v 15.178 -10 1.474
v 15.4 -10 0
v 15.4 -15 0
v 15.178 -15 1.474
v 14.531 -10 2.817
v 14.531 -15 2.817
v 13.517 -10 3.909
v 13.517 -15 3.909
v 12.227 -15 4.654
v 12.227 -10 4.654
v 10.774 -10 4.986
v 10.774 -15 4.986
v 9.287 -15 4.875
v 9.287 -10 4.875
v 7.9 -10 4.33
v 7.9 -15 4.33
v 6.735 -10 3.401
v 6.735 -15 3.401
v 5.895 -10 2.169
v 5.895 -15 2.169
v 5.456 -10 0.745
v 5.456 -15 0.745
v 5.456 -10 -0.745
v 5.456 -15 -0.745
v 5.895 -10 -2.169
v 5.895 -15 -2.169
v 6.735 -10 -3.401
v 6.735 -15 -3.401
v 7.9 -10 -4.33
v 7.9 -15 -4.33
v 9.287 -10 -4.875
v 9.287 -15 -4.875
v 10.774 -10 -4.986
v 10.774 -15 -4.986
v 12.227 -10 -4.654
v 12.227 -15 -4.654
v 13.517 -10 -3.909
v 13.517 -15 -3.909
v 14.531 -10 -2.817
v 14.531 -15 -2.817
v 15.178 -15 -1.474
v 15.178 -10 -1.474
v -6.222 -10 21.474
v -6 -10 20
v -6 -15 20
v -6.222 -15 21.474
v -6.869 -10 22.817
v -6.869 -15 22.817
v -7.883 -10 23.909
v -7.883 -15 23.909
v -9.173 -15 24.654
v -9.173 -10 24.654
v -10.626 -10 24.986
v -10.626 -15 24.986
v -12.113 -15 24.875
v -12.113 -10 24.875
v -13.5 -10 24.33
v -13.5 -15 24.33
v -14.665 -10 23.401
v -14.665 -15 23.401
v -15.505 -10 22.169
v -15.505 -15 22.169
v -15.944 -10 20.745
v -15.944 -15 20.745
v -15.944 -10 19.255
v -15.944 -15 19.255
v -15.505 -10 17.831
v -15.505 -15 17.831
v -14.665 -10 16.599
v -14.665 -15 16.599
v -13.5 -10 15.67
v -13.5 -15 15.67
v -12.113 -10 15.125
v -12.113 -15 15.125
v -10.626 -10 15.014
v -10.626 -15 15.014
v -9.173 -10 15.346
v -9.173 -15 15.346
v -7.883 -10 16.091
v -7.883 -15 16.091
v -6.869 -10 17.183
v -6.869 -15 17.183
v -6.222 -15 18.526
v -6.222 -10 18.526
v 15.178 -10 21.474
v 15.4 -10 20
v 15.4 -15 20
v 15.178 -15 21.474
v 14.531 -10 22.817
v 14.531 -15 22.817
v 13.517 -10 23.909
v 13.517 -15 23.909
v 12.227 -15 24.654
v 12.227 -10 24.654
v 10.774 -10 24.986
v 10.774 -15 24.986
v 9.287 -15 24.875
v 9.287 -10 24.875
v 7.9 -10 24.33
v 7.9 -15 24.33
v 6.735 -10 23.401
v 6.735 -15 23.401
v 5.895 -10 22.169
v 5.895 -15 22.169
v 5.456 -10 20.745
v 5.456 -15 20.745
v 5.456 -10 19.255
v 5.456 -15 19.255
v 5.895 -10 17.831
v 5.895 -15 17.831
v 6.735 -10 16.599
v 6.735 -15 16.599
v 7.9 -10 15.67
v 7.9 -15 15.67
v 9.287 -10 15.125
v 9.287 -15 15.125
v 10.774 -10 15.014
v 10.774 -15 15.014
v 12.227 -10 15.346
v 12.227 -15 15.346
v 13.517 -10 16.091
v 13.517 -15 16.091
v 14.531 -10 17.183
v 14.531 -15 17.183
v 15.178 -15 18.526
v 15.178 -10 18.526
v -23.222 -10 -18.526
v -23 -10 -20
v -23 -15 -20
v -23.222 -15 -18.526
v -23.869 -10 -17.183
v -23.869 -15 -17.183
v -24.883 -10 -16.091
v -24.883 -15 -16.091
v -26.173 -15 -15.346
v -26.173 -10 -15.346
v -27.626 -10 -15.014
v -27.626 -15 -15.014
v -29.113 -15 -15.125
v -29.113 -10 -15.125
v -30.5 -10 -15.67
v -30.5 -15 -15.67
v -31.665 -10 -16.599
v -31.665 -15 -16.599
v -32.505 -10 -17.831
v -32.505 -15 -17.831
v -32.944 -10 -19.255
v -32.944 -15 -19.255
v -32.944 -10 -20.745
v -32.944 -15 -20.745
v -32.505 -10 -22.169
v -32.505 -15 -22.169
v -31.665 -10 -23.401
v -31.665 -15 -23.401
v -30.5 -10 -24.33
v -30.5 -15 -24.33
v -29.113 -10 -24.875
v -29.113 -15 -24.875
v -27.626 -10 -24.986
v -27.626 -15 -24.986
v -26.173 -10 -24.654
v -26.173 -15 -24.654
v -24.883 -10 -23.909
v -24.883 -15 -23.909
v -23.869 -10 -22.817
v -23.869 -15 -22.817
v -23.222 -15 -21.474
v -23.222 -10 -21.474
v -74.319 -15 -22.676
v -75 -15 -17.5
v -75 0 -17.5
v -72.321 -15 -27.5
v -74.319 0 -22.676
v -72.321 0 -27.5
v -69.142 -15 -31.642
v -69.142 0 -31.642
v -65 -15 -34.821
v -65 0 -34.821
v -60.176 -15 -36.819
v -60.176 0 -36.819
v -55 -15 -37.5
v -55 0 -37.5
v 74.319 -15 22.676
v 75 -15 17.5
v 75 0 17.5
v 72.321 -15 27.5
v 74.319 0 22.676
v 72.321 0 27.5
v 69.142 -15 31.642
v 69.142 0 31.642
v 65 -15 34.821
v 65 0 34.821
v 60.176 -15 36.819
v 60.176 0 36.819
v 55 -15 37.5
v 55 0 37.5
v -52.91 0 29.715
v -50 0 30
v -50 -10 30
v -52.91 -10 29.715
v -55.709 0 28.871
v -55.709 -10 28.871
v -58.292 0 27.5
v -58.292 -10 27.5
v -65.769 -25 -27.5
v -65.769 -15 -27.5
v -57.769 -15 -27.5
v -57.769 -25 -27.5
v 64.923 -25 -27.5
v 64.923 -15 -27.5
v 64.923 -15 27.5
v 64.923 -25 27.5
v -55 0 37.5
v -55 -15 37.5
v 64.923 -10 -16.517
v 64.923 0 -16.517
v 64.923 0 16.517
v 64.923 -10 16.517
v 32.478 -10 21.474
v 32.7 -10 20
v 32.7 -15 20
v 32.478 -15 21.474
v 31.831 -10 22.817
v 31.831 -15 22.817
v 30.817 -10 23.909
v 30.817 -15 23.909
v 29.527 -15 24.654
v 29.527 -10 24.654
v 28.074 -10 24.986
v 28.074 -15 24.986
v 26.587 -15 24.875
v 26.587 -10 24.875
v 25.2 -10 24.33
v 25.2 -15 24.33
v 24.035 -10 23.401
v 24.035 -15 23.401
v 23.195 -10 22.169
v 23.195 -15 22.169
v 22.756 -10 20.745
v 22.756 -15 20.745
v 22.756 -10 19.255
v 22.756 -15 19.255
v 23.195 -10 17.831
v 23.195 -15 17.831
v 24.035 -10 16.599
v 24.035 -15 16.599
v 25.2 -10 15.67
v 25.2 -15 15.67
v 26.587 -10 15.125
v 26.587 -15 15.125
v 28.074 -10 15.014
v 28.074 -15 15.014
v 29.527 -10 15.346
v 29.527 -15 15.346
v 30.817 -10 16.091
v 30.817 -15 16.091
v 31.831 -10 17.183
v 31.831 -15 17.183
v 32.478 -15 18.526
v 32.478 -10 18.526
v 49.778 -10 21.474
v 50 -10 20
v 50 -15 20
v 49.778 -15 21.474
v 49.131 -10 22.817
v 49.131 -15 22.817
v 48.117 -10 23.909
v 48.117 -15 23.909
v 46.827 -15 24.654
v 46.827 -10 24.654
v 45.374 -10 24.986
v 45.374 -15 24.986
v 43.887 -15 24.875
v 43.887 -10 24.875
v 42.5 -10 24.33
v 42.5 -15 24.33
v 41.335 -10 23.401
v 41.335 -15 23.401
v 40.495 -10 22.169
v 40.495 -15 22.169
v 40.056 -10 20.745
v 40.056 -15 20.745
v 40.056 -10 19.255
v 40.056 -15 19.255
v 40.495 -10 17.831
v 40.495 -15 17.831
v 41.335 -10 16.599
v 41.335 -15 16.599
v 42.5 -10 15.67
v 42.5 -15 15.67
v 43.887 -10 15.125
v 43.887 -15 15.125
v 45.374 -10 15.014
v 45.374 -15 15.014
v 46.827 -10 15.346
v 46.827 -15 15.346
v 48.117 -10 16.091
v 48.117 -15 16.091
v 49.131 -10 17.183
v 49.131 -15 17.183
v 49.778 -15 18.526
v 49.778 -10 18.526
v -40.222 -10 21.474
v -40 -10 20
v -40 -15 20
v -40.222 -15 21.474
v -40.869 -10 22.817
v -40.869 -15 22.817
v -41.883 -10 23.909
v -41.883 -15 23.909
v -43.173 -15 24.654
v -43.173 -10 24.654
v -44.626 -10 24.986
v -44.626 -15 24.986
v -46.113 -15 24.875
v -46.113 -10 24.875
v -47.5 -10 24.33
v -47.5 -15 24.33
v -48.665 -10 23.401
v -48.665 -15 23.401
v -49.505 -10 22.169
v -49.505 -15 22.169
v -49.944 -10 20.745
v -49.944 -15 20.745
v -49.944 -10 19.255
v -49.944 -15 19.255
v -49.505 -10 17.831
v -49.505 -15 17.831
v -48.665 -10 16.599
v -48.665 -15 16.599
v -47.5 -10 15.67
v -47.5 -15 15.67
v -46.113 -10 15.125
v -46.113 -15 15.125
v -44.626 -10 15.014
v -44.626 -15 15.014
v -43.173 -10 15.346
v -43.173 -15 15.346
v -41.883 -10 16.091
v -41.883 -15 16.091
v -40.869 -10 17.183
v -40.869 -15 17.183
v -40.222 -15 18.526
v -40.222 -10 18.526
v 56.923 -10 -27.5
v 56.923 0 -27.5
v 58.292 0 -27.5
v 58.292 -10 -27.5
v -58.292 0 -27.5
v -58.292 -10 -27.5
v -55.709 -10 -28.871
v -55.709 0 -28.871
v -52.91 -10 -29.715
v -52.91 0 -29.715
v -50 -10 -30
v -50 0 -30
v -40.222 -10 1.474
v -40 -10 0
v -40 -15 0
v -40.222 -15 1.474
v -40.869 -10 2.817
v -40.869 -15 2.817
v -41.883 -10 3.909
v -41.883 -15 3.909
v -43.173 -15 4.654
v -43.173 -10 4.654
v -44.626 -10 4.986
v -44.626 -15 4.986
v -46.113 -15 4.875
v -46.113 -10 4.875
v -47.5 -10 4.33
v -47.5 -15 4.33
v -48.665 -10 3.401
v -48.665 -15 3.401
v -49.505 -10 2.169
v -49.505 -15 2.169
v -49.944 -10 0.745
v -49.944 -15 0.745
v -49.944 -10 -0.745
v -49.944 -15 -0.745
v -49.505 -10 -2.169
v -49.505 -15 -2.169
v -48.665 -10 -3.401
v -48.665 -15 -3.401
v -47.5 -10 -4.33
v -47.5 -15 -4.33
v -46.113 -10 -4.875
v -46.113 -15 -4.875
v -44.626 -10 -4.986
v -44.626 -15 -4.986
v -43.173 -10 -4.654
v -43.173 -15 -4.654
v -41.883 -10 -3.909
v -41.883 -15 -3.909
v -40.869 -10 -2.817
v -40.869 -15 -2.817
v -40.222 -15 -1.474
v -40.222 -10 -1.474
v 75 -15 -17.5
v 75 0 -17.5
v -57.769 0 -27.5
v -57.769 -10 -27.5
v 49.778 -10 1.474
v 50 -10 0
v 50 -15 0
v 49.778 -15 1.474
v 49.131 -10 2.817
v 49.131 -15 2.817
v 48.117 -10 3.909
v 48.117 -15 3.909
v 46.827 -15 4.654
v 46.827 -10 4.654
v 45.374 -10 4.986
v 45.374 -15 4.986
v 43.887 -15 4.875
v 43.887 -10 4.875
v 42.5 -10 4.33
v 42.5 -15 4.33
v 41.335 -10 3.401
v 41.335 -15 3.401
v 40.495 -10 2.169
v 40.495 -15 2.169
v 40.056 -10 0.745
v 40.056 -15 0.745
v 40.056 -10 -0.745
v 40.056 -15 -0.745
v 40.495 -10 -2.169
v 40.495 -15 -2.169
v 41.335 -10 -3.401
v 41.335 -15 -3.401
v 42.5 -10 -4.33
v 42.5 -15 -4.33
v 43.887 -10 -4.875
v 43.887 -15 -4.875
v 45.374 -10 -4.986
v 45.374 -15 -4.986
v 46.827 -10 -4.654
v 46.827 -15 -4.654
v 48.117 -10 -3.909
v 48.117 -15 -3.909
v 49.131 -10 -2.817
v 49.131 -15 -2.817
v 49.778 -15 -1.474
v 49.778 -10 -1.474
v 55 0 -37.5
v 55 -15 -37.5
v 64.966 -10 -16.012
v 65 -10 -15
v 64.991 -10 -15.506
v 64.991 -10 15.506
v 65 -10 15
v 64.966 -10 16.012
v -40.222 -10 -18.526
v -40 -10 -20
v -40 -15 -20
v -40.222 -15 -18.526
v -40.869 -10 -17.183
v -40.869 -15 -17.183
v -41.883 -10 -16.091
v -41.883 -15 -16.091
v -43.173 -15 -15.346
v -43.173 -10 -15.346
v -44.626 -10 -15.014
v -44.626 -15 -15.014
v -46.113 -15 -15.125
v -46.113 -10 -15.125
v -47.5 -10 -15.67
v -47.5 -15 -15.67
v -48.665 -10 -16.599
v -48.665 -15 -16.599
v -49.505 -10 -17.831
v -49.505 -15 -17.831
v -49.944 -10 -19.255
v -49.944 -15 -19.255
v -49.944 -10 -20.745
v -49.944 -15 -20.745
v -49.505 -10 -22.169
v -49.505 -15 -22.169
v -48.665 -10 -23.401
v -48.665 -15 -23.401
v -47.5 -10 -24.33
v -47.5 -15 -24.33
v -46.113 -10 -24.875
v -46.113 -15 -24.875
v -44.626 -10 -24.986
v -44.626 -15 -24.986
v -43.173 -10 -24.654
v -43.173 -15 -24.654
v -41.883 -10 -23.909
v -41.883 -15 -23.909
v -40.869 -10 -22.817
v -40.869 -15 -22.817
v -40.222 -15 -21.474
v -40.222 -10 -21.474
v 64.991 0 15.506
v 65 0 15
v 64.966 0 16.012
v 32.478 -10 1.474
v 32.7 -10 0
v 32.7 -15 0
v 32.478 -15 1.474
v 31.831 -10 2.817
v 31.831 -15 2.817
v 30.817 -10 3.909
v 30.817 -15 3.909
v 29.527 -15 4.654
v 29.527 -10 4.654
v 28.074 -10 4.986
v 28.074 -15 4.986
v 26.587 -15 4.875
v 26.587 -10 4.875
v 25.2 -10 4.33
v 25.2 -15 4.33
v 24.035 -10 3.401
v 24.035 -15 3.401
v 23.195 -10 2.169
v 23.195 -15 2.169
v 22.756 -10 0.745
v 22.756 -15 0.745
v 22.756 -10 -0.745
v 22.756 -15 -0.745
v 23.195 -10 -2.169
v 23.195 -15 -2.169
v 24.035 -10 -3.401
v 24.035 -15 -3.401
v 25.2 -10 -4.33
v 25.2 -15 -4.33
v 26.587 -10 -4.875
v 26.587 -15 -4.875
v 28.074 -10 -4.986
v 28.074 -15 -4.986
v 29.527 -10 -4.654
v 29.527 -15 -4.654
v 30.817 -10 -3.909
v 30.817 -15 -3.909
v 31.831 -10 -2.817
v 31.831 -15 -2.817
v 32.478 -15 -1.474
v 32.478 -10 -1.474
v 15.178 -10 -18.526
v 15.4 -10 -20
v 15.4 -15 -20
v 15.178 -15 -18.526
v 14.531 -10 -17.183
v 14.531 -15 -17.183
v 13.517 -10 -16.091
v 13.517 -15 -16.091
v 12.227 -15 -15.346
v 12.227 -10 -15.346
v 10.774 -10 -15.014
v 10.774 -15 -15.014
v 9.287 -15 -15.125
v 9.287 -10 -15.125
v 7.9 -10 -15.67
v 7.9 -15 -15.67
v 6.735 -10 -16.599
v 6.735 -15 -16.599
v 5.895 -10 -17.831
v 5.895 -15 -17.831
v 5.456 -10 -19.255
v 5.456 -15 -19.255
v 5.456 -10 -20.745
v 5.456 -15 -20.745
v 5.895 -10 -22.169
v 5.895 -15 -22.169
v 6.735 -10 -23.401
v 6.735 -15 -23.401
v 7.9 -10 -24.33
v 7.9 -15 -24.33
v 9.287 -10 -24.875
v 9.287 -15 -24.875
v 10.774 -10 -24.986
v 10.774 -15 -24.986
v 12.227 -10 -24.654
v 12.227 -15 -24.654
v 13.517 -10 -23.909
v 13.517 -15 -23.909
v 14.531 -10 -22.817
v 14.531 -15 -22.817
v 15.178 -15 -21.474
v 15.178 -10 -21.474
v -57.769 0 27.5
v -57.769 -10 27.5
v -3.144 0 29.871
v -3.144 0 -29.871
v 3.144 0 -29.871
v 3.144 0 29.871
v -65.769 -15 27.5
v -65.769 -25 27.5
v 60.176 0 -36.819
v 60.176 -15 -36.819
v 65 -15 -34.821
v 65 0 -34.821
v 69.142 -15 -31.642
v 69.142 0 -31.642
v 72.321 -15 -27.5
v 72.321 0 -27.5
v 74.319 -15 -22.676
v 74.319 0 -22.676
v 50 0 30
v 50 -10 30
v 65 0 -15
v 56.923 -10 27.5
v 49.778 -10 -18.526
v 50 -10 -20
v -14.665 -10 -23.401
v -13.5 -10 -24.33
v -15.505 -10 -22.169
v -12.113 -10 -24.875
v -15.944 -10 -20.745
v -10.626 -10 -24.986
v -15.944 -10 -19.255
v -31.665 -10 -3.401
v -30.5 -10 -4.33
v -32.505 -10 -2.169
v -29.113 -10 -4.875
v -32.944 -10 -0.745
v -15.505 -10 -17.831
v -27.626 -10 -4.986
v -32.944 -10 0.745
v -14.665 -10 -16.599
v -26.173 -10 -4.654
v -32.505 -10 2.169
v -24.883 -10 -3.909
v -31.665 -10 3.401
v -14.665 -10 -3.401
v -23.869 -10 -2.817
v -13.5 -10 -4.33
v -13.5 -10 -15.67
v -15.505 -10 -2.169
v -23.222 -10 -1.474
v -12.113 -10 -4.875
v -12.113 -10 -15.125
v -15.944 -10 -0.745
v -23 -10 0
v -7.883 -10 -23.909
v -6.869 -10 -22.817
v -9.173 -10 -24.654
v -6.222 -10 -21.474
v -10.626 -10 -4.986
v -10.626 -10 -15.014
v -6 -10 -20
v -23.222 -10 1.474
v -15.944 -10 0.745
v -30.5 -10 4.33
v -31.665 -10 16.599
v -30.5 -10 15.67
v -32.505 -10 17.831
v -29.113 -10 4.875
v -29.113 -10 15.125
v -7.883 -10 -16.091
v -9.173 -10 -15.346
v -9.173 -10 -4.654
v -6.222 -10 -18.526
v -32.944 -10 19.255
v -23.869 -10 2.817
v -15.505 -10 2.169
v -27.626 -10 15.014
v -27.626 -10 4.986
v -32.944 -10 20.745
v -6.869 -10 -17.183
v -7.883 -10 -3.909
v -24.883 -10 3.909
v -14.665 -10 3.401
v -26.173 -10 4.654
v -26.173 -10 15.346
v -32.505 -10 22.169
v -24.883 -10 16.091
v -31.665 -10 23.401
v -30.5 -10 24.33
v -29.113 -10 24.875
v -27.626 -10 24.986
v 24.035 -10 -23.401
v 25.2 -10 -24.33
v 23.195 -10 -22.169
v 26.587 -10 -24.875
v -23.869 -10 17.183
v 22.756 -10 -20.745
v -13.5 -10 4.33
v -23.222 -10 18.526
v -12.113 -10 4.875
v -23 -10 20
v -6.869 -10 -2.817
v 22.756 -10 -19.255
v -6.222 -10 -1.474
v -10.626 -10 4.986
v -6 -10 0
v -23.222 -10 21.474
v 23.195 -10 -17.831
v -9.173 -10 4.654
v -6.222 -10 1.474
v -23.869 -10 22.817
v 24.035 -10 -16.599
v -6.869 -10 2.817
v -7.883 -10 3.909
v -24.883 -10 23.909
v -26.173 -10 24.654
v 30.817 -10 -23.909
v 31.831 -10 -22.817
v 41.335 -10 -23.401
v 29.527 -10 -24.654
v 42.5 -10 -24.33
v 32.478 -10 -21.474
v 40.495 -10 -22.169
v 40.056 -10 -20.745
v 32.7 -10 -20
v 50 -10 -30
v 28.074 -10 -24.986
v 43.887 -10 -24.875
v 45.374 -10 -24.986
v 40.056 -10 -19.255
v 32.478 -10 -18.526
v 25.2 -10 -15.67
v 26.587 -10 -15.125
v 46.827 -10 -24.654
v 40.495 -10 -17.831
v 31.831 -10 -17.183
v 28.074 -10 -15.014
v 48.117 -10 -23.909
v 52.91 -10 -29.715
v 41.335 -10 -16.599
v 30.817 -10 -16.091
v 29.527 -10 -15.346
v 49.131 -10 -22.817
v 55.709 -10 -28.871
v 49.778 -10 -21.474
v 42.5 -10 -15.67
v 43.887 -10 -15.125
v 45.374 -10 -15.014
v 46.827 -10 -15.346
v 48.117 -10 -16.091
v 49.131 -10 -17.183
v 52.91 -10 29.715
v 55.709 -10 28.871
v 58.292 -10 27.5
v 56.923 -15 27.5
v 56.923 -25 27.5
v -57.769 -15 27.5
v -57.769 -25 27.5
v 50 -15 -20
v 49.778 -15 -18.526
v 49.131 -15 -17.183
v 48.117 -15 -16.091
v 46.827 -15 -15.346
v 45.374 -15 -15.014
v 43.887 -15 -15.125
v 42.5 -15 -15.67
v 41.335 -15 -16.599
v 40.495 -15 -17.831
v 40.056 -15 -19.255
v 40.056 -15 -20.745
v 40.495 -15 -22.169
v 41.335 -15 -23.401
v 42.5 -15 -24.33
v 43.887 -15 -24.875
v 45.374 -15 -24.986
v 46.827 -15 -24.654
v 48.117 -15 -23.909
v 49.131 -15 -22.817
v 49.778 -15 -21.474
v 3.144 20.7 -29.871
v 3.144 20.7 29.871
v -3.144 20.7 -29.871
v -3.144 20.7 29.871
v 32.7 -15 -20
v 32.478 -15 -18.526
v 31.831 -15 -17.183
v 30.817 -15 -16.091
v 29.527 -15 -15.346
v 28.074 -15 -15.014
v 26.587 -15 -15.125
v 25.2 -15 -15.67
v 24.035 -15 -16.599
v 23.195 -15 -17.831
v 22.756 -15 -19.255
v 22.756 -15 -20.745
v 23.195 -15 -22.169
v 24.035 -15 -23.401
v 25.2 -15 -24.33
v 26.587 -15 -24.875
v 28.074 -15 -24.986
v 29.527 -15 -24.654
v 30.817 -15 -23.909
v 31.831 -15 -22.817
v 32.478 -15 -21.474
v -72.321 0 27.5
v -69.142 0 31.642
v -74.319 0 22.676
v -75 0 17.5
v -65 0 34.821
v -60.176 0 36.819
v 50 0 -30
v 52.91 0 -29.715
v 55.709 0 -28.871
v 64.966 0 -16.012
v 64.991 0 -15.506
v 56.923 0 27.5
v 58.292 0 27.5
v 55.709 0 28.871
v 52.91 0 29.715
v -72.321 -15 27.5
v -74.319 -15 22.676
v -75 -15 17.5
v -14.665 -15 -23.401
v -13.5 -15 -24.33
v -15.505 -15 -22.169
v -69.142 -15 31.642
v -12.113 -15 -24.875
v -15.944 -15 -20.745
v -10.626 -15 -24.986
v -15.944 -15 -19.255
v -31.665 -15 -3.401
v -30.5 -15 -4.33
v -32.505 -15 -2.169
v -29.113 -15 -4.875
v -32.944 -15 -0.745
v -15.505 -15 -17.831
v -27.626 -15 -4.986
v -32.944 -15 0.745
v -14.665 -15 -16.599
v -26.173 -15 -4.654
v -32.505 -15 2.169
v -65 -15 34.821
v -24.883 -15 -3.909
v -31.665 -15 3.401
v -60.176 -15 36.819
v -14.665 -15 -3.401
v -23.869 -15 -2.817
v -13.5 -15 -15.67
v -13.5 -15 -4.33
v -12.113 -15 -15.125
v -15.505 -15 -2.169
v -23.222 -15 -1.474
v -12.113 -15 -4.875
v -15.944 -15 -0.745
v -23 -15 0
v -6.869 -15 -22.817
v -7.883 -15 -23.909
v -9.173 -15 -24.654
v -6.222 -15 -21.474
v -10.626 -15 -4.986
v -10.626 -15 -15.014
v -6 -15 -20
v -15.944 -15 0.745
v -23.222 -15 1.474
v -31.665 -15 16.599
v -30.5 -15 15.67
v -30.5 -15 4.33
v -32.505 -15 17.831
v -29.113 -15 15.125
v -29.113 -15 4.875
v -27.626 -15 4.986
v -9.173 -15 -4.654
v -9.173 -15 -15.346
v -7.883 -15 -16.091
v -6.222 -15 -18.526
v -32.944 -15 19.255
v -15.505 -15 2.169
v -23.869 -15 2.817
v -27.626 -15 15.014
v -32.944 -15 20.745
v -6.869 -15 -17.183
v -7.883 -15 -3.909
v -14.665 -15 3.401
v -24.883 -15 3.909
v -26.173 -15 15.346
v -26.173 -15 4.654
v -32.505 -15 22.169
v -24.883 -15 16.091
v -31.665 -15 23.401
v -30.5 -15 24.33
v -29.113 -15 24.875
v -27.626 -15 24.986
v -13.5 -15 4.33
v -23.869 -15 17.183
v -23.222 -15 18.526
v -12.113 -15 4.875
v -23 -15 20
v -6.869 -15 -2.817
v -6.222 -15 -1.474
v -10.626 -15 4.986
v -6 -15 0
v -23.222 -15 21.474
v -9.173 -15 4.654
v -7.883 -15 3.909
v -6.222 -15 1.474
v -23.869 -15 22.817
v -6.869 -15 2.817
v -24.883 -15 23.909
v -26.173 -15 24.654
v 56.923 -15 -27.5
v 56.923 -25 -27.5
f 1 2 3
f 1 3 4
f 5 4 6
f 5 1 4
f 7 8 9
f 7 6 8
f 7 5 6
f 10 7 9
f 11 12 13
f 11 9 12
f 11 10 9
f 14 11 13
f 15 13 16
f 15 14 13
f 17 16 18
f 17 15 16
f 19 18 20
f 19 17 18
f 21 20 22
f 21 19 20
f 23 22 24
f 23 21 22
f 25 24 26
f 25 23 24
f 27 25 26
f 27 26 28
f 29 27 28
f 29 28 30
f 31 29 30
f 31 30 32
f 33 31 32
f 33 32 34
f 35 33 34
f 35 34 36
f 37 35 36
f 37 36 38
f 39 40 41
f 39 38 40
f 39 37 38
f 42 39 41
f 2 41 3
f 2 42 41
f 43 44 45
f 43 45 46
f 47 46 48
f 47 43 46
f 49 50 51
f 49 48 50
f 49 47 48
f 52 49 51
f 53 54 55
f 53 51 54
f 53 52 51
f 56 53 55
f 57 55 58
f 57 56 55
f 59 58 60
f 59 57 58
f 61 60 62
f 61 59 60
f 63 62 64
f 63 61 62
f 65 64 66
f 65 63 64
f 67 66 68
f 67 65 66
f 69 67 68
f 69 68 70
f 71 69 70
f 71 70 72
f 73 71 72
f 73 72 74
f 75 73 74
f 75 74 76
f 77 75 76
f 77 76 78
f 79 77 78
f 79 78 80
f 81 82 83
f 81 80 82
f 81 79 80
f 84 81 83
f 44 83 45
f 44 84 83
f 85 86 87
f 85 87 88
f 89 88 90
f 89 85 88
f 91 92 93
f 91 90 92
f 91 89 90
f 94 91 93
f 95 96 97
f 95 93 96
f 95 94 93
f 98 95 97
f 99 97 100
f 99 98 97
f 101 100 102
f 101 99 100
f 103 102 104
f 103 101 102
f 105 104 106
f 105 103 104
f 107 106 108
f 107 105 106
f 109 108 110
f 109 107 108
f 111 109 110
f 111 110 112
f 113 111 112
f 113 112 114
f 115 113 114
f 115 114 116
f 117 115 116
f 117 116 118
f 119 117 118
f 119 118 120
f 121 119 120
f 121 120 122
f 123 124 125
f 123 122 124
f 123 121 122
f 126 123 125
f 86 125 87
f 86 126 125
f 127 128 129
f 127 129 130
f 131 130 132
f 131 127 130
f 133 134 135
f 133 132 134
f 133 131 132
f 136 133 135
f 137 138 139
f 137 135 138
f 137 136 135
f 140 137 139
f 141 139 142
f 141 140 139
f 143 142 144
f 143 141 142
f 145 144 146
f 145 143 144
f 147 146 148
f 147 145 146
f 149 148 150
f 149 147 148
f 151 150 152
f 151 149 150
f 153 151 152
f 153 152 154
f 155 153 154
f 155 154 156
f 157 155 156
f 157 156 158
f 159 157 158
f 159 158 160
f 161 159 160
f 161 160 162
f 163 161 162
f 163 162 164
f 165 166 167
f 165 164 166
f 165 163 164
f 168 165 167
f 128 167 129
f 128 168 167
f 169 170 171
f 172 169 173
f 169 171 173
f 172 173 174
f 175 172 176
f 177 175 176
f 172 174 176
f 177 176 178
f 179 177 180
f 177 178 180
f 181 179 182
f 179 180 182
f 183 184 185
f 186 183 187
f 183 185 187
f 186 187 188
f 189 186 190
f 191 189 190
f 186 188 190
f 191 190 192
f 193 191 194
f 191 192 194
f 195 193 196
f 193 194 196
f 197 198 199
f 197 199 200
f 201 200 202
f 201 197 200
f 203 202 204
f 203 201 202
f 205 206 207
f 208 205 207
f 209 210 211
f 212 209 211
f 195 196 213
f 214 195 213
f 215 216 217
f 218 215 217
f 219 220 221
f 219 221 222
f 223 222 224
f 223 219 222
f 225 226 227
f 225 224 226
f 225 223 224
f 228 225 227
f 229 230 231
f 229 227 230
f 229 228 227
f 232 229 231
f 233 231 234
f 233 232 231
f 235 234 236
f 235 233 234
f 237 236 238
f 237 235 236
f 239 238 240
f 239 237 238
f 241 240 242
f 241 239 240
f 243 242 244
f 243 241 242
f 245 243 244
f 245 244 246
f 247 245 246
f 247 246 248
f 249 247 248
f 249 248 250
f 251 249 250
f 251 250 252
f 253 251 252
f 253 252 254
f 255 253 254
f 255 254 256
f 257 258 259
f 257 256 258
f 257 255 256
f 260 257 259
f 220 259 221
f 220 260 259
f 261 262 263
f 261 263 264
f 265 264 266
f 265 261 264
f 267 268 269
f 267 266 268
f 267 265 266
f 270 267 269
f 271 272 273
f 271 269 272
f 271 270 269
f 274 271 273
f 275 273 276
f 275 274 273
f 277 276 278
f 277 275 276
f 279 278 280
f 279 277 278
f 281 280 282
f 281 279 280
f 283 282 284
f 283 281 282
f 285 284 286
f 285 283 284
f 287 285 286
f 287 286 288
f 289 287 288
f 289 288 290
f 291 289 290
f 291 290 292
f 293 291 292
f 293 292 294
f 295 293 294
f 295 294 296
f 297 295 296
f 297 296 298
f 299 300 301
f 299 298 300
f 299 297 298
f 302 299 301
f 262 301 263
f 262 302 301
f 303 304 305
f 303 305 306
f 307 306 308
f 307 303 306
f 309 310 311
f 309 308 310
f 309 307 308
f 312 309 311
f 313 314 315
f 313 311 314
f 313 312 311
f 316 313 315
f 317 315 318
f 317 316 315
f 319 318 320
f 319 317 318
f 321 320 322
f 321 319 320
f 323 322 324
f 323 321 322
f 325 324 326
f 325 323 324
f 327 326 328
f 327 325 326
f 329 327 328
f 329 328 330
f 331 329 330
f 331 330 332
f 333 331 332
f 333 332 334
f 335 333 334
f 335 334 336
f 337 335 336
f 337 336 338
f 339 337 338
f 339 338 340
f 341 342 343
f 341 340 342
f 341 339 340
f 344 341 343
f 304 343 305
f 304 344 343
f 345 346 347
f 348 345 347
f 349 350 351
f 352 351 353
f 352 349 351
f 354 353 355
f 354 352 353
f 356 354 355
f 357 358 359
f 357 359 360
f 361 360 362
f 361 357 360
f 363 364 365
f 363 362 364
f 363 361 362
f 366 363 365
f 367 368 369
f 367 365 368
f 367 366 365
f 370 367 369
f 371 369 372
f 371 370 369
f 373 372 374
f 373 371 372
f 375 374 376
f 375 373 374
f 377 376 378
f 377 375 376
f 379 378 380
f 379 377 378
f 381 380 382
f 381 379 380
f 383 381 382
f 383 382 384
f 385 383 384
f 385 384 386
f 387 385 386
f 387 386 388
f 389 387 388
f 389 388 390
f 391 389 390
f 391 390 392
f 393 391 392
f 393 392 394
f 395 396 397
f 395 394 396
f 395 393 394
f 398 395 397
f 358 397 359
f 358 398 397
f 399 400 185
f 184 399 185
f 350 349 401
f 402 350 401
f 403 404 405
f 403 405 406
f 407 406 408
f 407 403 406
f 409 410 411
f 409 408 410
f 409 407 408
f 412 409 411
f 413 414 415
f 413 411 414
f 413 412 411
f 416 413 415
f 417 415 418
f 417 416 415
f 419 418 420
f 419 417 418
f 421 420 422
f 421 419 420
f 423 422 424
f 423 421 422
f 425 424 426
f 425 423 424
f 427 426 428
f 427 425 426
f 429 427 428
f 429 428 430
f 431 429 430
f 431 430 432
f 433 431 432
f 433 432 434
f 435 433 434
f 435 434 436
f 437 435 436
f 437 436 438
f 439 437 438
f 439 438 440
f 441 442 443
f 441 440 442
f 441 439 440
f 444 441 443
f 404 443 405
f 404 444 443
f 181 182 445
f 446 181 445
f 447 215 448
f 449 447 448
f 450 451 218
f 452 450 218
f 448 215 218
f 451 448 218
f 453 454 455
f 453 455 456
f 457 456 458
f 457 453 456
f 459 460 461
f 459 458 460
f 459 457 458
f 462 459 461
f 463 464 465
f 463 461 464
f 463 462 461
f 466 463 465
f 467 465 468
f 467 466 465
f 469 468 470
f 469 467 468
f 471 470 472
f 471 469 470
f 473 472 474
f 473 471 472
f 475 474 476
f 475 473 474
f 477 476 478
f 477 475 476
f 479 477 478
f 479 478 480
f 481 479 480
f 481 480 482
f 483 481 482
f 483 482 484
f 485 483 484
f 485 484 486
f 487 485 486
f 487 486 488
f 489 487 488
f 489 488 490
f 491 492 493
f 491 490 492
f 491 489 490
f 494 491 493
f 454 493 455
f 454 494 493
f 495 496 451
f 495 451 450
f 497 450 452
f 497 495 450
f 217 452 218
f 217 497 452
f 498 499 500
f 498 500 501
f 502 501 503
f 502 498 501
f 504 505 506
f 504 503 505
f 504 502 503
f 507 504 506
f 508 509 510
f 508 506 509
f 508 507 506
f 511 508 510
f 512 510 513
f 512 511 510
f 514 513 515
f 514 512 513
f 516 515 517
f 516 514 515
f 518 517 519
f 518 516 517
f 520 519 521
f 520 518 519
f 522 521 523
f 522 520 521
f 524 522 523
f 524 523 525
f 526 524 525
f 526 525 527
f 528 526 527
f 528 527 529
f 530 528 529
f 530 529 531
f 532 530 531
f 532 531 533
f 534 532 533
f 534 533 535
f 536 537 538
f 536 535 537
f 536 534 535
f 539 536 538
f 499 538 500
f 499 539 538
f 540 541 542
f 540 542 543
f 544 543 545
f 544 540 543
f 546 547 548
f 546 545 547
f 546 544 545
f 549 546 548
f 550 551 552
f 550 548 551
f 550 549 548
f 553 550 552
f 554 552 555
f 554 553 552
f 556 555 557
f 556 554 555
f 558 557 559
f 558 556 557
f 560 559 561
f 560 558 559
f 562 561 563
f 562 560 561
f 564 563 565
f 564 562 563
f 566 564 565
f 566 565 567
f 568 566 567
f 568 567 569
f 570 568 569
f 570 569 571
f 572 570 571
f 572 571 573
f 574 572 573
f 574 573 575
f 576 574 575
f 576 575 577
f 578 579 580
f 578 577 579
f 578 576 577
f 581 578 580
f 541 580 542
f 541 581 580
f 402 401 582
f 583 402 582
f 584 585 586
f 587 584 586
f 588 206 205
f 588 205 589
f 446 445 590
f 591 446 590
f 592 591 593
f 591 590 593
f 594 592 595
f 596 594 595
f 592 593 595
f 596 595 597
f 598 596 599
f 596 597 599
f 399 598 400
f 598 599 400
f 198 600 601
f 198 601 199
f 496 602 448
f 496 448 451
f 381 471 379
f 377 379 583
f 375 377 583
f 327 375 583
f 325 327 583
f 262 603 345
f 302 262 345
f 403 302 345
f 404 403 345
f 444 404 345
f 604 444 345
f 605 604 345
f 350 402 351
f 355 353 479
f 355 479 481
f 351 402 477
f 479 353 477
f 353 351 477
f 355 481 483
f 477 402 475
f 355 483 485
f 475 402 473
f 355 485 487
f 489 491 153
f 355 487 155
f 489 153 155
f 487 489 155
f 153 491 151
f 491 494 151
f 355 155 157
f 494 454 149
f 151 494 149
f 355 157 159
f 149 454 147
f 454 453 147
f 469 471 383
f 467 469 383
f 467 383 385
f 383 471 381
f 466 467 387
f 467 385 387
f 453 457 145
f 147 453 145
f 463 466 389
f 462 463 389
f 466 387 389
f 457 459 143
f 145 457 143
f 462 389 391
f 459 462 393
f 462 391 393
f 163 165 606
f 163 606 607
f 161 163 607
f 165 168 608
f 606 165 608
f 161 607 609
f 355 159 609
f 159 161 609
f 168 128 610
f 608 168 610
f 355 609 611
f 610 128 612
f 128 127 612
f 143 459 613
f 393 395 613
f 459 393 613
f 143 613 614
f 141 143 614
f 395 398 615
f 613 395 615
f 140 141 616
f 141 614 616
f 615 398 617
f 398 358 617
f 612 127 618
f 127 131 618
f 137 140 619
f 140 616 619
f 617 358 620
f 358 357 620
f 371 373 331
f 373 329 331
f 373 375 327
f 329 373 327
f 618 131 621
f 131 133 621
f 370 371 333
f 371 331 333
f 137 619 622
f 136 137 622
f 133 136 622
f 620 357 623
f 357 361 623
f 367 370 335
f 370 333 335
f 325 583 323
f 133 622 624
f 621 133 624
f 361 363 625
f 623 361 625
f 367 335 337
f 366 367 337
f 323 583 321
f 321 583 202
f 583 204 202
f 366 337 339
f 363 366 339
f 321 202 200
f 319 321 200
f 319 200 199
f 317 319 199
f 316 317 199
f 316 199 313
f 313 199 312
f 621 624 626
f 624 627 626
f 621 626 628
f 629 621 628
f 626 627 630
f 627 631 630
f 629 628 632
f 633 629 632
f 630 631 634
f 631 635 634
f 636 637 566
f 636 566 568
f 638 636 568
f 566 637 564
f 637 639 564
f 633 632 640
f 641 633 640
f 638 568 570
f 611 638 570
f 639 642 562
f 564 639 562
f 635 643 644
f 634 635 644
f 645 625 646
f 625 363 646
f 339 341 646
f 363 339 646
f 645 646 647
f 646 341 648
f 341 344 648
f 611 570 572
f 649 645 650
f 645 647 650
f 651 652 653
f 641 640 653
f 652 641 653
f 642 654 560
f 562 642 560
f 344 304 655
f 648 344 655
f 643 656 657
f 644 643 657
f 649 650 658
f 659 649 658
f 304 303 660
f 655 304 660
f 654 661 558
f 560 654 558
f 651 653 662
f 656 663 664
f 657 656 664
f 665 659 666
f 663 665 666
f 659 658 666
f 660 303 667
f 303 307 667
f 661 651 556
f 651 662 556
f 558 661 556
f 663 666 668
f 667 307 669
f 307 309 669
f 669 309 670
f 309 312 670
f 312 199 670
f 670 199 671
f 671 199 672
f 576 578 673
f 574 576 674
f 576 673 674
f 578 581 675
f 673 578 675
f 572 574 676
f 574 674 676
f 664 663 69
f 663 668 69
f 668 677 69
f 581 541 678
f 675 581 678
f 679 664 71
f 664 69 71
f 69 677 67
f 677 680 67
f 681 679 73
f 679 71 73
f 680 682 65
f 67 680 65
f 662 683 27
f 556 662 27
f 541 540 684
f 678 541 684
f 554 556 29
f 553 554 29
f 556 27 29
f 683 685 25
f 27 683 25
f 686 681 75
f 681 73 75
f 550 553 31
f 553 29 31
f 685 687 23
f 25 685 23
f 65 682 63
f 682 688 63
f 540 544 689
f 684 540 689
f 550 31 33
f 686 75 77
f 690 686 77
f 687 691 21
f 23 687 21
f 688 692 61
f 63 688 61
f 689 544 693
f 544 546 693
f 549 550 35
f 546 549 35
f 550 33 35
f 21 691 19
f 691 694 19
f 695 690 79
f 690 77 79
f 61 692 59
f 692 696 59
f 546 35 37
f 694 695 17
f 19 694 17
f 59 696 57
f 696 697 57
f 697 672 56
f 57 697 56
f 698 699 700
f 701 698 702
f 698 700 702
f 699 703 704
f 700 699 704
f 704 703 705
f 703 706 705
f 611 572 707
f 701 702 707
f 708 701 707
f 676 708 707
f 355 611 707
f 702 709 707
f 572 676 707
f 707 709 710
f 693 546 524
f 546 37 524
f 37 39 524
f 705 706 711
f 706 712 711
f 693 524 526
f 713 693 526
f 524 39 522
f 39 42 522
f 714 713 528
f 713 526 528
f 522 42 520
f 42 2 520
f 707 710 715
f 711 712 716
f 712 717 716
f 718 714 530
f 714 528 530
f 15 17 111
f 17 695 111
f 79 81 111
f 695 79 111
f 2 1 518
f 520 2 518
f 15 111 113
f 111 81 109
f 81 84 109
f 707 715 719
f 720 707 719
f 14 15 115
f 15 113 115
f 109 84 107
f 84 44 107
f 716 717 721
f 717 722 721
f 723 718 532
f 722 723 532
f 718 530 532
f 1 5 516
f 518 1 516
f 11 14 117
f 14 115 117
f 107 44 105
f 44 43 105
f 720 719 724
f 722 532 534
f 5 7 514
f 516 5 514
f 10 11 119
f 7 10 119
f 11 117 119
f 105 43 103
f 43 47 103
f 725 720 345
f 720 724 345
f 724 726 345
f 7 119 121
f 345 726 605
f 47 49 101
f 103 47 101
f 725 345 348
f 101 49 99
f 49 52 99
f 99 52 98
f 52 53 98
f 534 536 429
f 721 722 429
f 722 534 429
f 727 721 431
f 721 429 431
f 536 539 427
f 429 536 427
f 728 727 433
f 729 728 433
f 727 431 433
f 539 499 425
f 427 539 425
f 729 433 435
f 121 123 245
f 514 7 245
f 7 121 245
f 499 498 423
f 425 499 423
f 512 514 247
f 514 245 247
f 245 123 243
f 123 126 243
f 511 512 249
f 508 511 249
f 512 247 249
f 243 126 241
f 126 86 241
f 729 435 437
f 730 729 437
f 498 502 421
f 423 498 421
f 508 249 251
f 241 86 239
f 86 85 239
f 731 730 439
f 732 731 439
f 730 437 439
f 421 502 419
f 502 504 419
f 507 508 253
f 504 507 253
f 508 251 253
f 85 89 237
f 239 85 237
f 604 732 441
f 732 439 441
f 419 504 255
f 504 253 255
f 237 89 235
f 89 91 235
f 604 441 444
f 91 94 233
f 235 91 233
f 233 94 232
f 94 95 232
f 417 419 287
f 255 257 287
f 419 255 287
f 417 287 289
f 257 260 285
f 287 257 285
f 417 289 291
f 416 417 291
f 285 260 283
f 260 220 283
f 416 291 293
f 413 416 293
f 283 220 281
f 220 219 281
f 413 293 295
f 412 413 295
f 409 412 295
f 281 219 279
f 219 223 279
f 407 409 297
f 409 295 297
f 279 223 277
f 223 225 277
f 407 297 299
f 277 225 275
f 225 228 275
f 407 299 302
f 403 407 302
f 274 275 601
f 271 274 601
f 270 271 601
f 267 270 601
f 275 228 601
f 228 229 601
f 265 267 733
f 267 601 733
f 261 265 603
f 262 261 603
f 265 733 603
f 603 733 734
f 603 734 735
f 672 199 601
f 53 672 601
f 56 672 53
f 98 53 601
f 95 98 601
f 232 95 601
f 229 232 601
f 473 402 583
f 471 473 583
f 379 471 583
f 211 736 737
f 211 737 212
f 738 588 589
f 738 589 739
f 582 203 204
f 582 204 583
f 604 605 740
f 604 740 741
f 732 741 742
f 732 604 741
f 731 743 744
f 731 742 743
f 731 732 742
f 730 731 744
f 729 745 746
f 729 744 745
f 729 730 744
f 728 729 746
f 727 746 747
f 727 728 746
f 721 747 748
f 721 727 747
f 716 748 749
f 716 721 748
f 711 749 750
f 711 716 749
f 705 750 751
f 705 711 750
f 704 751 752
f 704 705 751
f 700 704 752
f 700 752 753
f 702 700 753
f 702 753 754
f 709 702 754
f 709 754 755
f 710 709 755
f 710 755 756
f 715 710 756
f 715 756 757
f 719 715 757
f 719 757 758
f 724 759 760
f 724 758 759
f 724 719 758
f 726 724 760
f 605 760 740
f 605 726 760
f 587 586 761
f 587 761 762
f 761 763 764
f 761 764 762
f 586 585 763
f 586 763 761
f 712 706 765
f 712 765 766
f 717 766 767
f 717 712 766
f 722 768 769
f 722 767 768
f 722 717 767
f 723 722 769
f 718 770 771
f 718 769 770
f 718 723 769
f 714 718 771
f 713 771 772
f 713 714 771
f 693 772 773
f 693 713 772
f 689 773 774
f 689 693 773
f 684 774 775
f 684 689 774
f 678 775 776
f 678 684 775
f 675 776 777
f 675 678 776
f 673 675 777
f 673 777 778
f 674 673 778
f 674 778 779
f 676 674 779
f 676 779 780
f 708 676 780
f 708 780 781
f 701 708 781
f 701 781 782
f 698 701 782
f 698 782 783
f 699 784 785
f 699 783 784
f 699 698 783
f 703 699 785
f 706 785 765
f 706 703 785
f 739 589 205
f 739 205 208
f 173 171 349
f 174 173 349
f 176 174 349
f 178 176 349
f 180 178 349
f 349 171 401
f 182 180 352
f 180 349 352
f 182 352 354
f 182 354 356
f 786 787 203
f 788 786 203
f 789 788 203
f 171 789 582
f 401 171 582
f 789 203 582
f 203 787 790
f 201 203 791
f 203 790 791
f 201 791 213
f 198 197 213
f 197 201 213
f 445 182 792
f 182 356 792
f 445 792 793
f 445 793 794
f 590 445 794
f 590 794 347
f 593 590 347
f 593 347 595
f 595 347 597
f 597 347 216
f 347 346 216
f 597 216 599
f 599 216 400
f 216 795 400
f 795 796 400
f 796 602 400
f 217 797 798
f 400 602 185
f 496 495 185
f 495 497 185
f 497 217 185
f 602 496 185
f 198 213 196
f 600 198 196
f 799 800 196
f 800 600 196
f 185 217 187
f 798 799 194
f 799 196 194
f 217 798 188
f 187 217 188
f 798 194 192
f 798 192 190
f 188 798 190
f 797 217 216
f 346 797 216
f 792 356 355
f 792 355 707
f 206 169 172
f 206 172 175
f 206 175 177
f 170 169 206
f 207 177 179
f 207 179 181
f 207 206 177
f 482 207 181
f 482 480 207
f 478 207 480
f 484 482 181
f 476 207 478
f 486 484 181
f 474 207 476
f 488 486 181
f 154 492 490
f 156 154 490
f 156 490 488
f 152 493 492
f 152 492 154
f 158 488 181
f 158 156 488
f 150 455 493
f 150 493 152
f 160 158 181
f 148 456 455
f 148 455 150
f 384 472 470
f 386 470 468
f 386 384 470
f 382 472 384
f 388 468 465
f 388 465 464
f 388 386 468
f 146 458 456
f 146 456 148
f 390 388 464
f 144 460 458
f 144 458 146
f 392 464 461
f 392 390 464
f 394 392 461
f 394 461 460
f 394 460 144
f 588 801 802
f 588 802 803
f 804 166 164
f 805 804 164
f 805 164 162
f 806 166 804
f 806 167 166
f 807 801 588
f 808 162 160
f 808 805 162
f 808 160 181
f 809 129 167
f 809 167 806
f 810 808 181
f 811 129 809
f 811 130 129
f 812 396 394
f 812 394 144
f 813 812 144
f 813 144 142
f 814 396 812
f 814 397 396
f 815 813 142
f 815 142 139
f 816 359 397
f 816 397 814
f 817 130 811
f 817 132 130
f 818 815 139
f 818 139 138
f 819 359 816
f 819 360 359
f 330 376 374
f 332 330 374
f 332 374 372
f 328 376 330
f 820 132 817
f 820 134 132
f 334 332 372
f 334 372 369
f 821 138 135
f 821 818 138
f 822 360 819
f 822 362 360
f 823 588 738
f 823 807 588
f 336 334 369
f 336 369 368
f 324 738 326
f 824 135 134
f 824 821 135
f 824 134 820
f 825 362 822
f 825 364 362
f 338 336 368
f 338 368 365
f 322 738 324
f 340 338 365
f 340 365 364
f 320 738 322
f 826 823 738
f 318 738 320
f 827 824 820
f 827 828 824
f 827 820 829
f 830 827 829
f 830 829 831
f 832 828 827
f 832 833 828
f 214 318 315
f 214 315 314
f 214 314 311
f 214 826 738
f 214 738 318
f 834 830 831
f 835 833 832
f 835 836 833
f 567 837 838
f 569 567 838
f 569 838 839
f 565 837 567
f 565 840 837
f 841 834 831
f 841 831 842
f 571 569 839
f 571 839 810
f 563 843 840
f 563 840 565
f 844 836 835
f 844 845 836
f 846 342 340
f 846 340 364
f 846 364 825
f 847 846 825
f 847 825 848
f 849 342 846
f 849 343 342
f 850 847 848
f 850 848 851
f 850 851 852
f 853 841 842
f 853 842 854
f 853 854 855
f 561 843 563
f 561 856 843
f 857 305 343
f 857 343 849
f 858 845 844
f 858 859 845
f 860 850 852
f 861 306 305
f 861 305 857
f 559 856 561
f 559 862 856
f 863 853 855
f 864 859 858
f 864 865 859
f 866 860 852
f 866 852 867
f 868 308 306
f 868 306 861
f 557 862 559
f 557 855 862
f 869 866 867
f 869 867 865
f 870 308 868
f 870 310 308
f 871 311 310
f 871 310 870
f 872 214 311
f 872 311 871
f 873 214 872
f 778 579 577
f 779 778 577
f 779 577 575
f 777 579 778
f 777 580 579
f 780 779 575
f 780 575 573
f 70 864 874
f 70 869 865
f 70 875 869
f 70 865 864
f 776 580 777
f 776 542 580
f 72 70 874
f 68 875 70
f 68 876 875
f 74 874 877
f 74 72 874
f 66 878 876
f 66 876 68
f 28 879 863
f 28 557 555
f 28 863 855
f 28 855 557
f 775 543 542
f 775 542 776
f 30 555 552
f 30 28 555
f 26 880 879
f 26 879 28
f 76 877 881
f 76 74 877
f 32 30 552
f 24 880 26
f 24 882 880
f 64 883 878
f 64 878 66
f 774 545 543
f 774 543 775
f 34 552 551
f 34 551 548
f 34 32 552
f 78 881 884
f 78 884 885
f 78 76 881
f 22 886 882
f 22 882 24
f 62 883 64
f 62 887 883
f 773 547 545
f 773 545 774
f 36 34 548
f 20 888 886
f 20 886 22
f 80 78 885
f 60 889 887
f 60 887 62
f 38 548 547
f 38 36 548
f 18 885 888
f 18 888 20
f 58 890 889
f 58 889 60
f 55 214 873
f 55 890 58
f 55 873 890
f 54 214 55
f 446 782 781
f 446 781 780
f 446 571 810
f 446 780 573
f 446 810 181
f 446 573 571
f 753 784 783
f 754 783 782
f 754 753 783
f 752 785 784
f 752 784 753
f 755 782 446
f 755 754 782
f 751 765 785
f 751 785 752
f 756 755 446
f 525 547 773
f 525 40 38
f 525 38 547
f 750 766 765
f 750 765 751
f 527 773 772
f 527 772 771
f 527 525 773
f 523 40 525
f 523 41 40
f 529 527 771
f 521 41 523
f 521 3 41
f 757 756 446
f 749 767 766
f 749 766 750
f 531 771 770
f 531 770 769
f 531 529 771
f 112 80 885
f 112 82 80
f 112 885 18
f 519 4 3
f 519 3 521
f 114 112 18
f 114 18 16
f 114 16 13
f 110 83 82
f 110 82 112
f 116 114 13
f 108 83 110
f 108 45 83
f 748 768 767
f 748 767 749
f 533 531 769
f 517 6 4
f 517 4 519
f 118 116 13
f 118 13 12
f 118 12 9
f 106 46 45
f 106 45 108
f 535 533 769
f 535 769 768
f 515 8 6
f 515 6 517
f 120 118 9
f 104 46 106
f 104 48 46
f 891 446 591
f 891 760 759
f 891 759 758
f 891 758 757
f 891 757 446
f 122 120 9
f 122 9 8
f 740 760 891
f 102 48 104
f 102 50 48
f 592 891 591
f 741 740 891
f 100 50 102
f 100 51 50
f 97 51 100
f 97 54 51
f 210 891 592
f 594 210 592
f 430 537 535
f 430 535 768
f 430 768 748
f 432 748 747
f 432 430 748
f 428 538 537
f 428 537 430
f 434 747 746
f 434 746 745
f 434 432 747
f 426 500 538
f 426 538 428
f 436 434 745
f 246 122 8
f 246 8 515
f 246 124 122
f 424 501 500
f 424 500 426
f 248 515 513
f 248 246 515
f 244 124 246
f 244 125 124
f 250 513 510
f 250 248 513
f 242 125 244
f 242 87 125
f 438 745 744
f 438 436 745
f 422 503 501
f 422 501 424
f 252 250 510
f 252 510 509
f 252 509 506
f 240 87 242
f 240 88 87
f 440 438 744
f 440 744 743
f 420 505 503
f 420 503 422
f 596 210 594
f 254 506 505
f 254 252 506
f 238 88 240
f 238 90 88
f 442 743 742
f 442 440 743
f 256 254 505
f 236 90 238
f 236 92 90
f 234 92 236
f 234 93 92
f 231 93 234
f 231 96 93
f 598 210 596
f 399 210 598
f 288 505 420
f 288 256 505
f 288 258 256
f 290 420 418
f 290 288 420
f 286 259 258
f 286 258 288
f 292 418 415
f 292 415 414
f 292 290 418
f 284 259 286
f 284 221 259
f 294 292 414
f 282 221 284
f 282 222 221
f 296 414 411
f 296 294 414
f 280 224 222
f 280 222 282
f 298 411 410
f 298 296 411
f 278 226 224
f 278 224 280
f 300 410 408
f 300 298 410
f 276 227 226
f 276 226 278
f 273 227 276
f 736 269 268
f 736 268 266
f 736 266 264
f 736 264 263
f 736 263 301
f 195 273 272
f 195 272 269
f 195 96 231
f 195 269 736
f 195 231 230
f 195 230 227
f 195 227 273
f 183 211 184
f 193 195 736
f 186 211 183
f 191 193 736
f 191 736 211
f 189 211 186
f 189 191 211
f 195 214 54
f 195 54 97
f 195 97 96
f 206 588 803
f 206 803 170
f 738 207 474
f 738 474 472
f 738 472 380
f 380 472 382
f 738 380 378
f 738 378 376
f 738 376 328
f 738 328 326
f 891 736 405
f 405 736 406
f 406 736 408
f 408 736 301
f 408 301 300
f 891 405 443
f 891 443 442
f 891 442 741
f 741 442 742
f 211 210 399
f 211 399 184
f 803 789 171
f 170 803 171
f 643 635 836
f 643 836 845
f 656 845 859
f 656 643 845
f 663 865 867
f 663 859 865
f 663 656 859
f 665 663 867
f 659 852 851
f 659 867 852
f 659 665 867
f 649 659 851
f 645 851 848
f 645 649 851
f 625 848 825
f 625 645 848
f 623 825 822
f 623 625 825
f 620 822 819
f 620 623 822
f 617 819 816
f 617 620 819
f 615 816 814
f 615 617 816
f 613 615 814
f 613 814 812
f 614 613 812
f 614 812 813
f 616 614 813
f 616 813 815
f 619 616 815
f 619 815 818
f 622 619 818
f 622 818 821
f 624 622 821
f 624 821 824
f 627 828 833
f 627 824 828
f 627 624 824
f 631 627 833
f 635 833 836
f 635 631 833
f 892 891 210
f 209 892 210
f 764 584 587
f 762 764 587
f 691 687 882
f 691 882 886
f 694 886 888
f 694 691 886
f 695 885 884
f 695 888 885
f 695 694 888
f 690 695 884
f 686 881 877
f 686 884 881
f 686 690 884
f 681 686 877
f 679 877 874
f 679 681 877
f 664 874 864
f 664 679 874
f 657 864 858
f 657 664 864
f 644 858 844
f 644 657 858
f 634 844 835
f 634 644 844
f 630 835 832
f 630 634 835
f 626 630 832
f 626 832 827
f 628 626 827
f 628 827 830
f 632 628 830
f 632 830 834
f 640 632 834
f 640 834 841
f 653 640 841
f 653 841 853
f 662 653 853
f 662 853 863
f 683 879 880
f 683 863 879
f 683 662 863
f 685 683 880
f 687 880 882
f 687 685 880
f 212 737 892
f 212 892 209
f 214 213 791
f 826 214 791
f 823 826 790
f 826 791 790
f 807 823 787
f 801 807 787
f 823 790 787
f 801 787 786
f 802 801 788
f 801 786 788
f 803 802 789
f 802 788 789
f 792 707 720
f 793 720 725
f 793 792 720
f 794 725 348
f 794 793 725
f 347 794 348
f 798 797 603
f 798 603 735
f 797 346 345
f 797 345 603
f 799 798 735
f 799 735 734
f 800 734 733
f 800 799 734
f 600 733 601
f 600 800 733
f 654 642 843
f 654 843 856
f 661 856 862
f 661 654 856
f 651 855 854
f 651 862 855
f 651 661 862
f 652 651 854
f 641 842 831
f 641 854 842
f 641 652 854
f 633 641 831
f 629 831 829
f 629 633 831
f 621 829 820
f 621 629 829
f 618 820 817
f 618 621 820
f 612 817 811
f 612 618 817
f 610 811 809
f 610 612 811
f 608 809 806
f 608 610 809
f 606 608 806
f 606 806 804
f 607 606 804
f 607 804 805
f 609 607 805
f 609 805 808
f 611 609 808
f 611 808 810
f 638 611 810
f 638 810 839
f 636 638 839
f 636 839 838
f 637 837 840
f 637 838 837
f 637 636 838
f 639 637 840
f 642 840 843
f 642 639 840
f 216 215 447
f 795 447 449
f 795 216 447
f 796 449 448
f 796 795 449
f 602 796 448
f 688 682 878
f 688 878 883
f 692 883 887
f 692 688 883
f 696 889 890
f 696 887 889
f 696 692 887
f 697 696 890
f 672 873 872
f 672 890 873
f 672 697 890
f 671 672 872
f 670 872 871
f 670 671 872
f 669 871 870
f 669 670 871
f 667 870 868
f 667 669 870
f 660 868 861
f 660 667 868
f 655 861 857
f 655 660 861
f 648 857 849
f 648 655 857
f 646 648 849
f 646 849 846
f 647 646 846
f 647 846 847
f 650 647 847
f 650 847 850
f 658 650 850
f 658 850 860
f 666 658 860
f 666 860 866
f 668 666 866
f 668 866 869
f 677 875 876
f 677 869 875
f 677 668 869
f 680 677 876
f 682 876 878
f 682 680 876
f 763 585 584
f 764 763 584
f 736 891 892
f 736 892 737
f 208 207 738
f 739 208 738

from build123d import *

# Parameters (mm, degrees)
F1_DEPTH = 15
F3_DEPTH = 10
F4_W     = 6.288568
F4_H     = 59.741382
F5_DEPTH = 20.7
F6_R     = 5
F7_DEPTH = 15.001
F8_W     = 8
F8_H     = 55
F9_DEPTH = 25


with BuildPart() as f1:
    # F0 (on Front) → F1 (new body)
    with BuildSketch(Plane.XZ):
        with BuildLine():
            Line((55, 37.5), (-55, 37.5))
            ThreePointArc((-55, 37.5), (-69.142136, 31.642136), (-75, 17.5))
            Line((-75, 17.5), (-75, -17.5))
            ThreePointArc((-75, -17.5), (-69.142136, -31.642136), (-55, -37.5))
            Line((-55, -37.5), (55, -37.5))
            ThreePointArc((55, -37.5), (69.142136, -31.642136), (75, -17.5))
            Line((75, -17.5), (75, 17.5))
            ThreePointArc((75, 17.5), (69.142136, 31.642136), (55, 37.5))
        make_face()
    extrude(amount=F1_DEPTH)

    # F2 (on Front) → F3 (cut)
    with BuildSketch(Plane.XZ):
        with BuildLine():
            ThreePointArc((65, 15), (60.606602, 25.606602), (50, 30))
            Line((50, 30), (-50, 30))
            ThreePointArc((-50, 30), (-60.606602, 25.606602), (-65, 15))
            Line((-65, 15), (-65, -15))
            ThreePointArc((-65, -15), (-60.606602, -25.606602), (-50, -30))
            Line((-50, -30), (50, -30))
            ThreePointArc((50, -30), (60.606602, -25.606602), (65, -15))
            Line((65, -15), (65, 15))
        make_face()
    extrude(amount=F3_DEPTH, mode=Mode.SUBTRACT)

    # F6 (on Front) → F7 (cut, through all)
    with BuildSketch(Plane.XZ):
        with Locations((45, -20)):
            Circle(F6_R)
        with Locations((45, 0)):
            Circle(F6_R)
        with Locations((27.7, 20)):
            Circle(F6_R)
        with Locations((10.4, 20)):
            Circle(F6_R)
        with Locations((27.7, 0)):
            Circle(F6_R)
        with Locations((10.4, 0)):
            Circle(F6_R)
        with Locations((27.7, -20)):
            Circle(F6_R)
        with Locations((10.4, -20)):
            Circle(F6_R)
        with Locations((-45, 20)):
            Circle(F6_R)
        with Locations((-28, 20)):
            Circle(F6_R)
        with Locations((-11, 20)):
            Circle(F6_R)
        with Locations((-45, -20)):
            Circle(F6_R)
        with Locations((-28, -20)):
            Circle(F6_R)
        with Locations((-11, -20)):
            Circle(F6_R)
        with Locations((-45, 0)):
            Circle(F6_R)
        with Locations((-28, 0)):
            Circle(F6_R)
        with Locations((-11, 0)):
            Circle(F6_R)
        with Locations((45, 20)):
            Circle(F6_R)
    extrude(amount=F7_DEPTH, mode=Mode.SUBTRACT)

    # F8 (on Front) → F9 (join)
    with BuildSketch(Plane.XZ):
        with Locations((-61.769237, 0)):
            Rectangle(F8_W, F8_H)
        with Locations((60.923083, 0)):
            Rectangle(F8_W, F8_H)
    extrude(amount=F9_DEPTH)


with BuildPart() as f5:
    # F4 (on Front) → F5 (new body)
    with BuildSketch(Plane.XZ):
        Rectangle(F4_W, F4_H)
    extrude(amount=-F5_DEPTH)


solid = Compound([f1.part, f5.part])
